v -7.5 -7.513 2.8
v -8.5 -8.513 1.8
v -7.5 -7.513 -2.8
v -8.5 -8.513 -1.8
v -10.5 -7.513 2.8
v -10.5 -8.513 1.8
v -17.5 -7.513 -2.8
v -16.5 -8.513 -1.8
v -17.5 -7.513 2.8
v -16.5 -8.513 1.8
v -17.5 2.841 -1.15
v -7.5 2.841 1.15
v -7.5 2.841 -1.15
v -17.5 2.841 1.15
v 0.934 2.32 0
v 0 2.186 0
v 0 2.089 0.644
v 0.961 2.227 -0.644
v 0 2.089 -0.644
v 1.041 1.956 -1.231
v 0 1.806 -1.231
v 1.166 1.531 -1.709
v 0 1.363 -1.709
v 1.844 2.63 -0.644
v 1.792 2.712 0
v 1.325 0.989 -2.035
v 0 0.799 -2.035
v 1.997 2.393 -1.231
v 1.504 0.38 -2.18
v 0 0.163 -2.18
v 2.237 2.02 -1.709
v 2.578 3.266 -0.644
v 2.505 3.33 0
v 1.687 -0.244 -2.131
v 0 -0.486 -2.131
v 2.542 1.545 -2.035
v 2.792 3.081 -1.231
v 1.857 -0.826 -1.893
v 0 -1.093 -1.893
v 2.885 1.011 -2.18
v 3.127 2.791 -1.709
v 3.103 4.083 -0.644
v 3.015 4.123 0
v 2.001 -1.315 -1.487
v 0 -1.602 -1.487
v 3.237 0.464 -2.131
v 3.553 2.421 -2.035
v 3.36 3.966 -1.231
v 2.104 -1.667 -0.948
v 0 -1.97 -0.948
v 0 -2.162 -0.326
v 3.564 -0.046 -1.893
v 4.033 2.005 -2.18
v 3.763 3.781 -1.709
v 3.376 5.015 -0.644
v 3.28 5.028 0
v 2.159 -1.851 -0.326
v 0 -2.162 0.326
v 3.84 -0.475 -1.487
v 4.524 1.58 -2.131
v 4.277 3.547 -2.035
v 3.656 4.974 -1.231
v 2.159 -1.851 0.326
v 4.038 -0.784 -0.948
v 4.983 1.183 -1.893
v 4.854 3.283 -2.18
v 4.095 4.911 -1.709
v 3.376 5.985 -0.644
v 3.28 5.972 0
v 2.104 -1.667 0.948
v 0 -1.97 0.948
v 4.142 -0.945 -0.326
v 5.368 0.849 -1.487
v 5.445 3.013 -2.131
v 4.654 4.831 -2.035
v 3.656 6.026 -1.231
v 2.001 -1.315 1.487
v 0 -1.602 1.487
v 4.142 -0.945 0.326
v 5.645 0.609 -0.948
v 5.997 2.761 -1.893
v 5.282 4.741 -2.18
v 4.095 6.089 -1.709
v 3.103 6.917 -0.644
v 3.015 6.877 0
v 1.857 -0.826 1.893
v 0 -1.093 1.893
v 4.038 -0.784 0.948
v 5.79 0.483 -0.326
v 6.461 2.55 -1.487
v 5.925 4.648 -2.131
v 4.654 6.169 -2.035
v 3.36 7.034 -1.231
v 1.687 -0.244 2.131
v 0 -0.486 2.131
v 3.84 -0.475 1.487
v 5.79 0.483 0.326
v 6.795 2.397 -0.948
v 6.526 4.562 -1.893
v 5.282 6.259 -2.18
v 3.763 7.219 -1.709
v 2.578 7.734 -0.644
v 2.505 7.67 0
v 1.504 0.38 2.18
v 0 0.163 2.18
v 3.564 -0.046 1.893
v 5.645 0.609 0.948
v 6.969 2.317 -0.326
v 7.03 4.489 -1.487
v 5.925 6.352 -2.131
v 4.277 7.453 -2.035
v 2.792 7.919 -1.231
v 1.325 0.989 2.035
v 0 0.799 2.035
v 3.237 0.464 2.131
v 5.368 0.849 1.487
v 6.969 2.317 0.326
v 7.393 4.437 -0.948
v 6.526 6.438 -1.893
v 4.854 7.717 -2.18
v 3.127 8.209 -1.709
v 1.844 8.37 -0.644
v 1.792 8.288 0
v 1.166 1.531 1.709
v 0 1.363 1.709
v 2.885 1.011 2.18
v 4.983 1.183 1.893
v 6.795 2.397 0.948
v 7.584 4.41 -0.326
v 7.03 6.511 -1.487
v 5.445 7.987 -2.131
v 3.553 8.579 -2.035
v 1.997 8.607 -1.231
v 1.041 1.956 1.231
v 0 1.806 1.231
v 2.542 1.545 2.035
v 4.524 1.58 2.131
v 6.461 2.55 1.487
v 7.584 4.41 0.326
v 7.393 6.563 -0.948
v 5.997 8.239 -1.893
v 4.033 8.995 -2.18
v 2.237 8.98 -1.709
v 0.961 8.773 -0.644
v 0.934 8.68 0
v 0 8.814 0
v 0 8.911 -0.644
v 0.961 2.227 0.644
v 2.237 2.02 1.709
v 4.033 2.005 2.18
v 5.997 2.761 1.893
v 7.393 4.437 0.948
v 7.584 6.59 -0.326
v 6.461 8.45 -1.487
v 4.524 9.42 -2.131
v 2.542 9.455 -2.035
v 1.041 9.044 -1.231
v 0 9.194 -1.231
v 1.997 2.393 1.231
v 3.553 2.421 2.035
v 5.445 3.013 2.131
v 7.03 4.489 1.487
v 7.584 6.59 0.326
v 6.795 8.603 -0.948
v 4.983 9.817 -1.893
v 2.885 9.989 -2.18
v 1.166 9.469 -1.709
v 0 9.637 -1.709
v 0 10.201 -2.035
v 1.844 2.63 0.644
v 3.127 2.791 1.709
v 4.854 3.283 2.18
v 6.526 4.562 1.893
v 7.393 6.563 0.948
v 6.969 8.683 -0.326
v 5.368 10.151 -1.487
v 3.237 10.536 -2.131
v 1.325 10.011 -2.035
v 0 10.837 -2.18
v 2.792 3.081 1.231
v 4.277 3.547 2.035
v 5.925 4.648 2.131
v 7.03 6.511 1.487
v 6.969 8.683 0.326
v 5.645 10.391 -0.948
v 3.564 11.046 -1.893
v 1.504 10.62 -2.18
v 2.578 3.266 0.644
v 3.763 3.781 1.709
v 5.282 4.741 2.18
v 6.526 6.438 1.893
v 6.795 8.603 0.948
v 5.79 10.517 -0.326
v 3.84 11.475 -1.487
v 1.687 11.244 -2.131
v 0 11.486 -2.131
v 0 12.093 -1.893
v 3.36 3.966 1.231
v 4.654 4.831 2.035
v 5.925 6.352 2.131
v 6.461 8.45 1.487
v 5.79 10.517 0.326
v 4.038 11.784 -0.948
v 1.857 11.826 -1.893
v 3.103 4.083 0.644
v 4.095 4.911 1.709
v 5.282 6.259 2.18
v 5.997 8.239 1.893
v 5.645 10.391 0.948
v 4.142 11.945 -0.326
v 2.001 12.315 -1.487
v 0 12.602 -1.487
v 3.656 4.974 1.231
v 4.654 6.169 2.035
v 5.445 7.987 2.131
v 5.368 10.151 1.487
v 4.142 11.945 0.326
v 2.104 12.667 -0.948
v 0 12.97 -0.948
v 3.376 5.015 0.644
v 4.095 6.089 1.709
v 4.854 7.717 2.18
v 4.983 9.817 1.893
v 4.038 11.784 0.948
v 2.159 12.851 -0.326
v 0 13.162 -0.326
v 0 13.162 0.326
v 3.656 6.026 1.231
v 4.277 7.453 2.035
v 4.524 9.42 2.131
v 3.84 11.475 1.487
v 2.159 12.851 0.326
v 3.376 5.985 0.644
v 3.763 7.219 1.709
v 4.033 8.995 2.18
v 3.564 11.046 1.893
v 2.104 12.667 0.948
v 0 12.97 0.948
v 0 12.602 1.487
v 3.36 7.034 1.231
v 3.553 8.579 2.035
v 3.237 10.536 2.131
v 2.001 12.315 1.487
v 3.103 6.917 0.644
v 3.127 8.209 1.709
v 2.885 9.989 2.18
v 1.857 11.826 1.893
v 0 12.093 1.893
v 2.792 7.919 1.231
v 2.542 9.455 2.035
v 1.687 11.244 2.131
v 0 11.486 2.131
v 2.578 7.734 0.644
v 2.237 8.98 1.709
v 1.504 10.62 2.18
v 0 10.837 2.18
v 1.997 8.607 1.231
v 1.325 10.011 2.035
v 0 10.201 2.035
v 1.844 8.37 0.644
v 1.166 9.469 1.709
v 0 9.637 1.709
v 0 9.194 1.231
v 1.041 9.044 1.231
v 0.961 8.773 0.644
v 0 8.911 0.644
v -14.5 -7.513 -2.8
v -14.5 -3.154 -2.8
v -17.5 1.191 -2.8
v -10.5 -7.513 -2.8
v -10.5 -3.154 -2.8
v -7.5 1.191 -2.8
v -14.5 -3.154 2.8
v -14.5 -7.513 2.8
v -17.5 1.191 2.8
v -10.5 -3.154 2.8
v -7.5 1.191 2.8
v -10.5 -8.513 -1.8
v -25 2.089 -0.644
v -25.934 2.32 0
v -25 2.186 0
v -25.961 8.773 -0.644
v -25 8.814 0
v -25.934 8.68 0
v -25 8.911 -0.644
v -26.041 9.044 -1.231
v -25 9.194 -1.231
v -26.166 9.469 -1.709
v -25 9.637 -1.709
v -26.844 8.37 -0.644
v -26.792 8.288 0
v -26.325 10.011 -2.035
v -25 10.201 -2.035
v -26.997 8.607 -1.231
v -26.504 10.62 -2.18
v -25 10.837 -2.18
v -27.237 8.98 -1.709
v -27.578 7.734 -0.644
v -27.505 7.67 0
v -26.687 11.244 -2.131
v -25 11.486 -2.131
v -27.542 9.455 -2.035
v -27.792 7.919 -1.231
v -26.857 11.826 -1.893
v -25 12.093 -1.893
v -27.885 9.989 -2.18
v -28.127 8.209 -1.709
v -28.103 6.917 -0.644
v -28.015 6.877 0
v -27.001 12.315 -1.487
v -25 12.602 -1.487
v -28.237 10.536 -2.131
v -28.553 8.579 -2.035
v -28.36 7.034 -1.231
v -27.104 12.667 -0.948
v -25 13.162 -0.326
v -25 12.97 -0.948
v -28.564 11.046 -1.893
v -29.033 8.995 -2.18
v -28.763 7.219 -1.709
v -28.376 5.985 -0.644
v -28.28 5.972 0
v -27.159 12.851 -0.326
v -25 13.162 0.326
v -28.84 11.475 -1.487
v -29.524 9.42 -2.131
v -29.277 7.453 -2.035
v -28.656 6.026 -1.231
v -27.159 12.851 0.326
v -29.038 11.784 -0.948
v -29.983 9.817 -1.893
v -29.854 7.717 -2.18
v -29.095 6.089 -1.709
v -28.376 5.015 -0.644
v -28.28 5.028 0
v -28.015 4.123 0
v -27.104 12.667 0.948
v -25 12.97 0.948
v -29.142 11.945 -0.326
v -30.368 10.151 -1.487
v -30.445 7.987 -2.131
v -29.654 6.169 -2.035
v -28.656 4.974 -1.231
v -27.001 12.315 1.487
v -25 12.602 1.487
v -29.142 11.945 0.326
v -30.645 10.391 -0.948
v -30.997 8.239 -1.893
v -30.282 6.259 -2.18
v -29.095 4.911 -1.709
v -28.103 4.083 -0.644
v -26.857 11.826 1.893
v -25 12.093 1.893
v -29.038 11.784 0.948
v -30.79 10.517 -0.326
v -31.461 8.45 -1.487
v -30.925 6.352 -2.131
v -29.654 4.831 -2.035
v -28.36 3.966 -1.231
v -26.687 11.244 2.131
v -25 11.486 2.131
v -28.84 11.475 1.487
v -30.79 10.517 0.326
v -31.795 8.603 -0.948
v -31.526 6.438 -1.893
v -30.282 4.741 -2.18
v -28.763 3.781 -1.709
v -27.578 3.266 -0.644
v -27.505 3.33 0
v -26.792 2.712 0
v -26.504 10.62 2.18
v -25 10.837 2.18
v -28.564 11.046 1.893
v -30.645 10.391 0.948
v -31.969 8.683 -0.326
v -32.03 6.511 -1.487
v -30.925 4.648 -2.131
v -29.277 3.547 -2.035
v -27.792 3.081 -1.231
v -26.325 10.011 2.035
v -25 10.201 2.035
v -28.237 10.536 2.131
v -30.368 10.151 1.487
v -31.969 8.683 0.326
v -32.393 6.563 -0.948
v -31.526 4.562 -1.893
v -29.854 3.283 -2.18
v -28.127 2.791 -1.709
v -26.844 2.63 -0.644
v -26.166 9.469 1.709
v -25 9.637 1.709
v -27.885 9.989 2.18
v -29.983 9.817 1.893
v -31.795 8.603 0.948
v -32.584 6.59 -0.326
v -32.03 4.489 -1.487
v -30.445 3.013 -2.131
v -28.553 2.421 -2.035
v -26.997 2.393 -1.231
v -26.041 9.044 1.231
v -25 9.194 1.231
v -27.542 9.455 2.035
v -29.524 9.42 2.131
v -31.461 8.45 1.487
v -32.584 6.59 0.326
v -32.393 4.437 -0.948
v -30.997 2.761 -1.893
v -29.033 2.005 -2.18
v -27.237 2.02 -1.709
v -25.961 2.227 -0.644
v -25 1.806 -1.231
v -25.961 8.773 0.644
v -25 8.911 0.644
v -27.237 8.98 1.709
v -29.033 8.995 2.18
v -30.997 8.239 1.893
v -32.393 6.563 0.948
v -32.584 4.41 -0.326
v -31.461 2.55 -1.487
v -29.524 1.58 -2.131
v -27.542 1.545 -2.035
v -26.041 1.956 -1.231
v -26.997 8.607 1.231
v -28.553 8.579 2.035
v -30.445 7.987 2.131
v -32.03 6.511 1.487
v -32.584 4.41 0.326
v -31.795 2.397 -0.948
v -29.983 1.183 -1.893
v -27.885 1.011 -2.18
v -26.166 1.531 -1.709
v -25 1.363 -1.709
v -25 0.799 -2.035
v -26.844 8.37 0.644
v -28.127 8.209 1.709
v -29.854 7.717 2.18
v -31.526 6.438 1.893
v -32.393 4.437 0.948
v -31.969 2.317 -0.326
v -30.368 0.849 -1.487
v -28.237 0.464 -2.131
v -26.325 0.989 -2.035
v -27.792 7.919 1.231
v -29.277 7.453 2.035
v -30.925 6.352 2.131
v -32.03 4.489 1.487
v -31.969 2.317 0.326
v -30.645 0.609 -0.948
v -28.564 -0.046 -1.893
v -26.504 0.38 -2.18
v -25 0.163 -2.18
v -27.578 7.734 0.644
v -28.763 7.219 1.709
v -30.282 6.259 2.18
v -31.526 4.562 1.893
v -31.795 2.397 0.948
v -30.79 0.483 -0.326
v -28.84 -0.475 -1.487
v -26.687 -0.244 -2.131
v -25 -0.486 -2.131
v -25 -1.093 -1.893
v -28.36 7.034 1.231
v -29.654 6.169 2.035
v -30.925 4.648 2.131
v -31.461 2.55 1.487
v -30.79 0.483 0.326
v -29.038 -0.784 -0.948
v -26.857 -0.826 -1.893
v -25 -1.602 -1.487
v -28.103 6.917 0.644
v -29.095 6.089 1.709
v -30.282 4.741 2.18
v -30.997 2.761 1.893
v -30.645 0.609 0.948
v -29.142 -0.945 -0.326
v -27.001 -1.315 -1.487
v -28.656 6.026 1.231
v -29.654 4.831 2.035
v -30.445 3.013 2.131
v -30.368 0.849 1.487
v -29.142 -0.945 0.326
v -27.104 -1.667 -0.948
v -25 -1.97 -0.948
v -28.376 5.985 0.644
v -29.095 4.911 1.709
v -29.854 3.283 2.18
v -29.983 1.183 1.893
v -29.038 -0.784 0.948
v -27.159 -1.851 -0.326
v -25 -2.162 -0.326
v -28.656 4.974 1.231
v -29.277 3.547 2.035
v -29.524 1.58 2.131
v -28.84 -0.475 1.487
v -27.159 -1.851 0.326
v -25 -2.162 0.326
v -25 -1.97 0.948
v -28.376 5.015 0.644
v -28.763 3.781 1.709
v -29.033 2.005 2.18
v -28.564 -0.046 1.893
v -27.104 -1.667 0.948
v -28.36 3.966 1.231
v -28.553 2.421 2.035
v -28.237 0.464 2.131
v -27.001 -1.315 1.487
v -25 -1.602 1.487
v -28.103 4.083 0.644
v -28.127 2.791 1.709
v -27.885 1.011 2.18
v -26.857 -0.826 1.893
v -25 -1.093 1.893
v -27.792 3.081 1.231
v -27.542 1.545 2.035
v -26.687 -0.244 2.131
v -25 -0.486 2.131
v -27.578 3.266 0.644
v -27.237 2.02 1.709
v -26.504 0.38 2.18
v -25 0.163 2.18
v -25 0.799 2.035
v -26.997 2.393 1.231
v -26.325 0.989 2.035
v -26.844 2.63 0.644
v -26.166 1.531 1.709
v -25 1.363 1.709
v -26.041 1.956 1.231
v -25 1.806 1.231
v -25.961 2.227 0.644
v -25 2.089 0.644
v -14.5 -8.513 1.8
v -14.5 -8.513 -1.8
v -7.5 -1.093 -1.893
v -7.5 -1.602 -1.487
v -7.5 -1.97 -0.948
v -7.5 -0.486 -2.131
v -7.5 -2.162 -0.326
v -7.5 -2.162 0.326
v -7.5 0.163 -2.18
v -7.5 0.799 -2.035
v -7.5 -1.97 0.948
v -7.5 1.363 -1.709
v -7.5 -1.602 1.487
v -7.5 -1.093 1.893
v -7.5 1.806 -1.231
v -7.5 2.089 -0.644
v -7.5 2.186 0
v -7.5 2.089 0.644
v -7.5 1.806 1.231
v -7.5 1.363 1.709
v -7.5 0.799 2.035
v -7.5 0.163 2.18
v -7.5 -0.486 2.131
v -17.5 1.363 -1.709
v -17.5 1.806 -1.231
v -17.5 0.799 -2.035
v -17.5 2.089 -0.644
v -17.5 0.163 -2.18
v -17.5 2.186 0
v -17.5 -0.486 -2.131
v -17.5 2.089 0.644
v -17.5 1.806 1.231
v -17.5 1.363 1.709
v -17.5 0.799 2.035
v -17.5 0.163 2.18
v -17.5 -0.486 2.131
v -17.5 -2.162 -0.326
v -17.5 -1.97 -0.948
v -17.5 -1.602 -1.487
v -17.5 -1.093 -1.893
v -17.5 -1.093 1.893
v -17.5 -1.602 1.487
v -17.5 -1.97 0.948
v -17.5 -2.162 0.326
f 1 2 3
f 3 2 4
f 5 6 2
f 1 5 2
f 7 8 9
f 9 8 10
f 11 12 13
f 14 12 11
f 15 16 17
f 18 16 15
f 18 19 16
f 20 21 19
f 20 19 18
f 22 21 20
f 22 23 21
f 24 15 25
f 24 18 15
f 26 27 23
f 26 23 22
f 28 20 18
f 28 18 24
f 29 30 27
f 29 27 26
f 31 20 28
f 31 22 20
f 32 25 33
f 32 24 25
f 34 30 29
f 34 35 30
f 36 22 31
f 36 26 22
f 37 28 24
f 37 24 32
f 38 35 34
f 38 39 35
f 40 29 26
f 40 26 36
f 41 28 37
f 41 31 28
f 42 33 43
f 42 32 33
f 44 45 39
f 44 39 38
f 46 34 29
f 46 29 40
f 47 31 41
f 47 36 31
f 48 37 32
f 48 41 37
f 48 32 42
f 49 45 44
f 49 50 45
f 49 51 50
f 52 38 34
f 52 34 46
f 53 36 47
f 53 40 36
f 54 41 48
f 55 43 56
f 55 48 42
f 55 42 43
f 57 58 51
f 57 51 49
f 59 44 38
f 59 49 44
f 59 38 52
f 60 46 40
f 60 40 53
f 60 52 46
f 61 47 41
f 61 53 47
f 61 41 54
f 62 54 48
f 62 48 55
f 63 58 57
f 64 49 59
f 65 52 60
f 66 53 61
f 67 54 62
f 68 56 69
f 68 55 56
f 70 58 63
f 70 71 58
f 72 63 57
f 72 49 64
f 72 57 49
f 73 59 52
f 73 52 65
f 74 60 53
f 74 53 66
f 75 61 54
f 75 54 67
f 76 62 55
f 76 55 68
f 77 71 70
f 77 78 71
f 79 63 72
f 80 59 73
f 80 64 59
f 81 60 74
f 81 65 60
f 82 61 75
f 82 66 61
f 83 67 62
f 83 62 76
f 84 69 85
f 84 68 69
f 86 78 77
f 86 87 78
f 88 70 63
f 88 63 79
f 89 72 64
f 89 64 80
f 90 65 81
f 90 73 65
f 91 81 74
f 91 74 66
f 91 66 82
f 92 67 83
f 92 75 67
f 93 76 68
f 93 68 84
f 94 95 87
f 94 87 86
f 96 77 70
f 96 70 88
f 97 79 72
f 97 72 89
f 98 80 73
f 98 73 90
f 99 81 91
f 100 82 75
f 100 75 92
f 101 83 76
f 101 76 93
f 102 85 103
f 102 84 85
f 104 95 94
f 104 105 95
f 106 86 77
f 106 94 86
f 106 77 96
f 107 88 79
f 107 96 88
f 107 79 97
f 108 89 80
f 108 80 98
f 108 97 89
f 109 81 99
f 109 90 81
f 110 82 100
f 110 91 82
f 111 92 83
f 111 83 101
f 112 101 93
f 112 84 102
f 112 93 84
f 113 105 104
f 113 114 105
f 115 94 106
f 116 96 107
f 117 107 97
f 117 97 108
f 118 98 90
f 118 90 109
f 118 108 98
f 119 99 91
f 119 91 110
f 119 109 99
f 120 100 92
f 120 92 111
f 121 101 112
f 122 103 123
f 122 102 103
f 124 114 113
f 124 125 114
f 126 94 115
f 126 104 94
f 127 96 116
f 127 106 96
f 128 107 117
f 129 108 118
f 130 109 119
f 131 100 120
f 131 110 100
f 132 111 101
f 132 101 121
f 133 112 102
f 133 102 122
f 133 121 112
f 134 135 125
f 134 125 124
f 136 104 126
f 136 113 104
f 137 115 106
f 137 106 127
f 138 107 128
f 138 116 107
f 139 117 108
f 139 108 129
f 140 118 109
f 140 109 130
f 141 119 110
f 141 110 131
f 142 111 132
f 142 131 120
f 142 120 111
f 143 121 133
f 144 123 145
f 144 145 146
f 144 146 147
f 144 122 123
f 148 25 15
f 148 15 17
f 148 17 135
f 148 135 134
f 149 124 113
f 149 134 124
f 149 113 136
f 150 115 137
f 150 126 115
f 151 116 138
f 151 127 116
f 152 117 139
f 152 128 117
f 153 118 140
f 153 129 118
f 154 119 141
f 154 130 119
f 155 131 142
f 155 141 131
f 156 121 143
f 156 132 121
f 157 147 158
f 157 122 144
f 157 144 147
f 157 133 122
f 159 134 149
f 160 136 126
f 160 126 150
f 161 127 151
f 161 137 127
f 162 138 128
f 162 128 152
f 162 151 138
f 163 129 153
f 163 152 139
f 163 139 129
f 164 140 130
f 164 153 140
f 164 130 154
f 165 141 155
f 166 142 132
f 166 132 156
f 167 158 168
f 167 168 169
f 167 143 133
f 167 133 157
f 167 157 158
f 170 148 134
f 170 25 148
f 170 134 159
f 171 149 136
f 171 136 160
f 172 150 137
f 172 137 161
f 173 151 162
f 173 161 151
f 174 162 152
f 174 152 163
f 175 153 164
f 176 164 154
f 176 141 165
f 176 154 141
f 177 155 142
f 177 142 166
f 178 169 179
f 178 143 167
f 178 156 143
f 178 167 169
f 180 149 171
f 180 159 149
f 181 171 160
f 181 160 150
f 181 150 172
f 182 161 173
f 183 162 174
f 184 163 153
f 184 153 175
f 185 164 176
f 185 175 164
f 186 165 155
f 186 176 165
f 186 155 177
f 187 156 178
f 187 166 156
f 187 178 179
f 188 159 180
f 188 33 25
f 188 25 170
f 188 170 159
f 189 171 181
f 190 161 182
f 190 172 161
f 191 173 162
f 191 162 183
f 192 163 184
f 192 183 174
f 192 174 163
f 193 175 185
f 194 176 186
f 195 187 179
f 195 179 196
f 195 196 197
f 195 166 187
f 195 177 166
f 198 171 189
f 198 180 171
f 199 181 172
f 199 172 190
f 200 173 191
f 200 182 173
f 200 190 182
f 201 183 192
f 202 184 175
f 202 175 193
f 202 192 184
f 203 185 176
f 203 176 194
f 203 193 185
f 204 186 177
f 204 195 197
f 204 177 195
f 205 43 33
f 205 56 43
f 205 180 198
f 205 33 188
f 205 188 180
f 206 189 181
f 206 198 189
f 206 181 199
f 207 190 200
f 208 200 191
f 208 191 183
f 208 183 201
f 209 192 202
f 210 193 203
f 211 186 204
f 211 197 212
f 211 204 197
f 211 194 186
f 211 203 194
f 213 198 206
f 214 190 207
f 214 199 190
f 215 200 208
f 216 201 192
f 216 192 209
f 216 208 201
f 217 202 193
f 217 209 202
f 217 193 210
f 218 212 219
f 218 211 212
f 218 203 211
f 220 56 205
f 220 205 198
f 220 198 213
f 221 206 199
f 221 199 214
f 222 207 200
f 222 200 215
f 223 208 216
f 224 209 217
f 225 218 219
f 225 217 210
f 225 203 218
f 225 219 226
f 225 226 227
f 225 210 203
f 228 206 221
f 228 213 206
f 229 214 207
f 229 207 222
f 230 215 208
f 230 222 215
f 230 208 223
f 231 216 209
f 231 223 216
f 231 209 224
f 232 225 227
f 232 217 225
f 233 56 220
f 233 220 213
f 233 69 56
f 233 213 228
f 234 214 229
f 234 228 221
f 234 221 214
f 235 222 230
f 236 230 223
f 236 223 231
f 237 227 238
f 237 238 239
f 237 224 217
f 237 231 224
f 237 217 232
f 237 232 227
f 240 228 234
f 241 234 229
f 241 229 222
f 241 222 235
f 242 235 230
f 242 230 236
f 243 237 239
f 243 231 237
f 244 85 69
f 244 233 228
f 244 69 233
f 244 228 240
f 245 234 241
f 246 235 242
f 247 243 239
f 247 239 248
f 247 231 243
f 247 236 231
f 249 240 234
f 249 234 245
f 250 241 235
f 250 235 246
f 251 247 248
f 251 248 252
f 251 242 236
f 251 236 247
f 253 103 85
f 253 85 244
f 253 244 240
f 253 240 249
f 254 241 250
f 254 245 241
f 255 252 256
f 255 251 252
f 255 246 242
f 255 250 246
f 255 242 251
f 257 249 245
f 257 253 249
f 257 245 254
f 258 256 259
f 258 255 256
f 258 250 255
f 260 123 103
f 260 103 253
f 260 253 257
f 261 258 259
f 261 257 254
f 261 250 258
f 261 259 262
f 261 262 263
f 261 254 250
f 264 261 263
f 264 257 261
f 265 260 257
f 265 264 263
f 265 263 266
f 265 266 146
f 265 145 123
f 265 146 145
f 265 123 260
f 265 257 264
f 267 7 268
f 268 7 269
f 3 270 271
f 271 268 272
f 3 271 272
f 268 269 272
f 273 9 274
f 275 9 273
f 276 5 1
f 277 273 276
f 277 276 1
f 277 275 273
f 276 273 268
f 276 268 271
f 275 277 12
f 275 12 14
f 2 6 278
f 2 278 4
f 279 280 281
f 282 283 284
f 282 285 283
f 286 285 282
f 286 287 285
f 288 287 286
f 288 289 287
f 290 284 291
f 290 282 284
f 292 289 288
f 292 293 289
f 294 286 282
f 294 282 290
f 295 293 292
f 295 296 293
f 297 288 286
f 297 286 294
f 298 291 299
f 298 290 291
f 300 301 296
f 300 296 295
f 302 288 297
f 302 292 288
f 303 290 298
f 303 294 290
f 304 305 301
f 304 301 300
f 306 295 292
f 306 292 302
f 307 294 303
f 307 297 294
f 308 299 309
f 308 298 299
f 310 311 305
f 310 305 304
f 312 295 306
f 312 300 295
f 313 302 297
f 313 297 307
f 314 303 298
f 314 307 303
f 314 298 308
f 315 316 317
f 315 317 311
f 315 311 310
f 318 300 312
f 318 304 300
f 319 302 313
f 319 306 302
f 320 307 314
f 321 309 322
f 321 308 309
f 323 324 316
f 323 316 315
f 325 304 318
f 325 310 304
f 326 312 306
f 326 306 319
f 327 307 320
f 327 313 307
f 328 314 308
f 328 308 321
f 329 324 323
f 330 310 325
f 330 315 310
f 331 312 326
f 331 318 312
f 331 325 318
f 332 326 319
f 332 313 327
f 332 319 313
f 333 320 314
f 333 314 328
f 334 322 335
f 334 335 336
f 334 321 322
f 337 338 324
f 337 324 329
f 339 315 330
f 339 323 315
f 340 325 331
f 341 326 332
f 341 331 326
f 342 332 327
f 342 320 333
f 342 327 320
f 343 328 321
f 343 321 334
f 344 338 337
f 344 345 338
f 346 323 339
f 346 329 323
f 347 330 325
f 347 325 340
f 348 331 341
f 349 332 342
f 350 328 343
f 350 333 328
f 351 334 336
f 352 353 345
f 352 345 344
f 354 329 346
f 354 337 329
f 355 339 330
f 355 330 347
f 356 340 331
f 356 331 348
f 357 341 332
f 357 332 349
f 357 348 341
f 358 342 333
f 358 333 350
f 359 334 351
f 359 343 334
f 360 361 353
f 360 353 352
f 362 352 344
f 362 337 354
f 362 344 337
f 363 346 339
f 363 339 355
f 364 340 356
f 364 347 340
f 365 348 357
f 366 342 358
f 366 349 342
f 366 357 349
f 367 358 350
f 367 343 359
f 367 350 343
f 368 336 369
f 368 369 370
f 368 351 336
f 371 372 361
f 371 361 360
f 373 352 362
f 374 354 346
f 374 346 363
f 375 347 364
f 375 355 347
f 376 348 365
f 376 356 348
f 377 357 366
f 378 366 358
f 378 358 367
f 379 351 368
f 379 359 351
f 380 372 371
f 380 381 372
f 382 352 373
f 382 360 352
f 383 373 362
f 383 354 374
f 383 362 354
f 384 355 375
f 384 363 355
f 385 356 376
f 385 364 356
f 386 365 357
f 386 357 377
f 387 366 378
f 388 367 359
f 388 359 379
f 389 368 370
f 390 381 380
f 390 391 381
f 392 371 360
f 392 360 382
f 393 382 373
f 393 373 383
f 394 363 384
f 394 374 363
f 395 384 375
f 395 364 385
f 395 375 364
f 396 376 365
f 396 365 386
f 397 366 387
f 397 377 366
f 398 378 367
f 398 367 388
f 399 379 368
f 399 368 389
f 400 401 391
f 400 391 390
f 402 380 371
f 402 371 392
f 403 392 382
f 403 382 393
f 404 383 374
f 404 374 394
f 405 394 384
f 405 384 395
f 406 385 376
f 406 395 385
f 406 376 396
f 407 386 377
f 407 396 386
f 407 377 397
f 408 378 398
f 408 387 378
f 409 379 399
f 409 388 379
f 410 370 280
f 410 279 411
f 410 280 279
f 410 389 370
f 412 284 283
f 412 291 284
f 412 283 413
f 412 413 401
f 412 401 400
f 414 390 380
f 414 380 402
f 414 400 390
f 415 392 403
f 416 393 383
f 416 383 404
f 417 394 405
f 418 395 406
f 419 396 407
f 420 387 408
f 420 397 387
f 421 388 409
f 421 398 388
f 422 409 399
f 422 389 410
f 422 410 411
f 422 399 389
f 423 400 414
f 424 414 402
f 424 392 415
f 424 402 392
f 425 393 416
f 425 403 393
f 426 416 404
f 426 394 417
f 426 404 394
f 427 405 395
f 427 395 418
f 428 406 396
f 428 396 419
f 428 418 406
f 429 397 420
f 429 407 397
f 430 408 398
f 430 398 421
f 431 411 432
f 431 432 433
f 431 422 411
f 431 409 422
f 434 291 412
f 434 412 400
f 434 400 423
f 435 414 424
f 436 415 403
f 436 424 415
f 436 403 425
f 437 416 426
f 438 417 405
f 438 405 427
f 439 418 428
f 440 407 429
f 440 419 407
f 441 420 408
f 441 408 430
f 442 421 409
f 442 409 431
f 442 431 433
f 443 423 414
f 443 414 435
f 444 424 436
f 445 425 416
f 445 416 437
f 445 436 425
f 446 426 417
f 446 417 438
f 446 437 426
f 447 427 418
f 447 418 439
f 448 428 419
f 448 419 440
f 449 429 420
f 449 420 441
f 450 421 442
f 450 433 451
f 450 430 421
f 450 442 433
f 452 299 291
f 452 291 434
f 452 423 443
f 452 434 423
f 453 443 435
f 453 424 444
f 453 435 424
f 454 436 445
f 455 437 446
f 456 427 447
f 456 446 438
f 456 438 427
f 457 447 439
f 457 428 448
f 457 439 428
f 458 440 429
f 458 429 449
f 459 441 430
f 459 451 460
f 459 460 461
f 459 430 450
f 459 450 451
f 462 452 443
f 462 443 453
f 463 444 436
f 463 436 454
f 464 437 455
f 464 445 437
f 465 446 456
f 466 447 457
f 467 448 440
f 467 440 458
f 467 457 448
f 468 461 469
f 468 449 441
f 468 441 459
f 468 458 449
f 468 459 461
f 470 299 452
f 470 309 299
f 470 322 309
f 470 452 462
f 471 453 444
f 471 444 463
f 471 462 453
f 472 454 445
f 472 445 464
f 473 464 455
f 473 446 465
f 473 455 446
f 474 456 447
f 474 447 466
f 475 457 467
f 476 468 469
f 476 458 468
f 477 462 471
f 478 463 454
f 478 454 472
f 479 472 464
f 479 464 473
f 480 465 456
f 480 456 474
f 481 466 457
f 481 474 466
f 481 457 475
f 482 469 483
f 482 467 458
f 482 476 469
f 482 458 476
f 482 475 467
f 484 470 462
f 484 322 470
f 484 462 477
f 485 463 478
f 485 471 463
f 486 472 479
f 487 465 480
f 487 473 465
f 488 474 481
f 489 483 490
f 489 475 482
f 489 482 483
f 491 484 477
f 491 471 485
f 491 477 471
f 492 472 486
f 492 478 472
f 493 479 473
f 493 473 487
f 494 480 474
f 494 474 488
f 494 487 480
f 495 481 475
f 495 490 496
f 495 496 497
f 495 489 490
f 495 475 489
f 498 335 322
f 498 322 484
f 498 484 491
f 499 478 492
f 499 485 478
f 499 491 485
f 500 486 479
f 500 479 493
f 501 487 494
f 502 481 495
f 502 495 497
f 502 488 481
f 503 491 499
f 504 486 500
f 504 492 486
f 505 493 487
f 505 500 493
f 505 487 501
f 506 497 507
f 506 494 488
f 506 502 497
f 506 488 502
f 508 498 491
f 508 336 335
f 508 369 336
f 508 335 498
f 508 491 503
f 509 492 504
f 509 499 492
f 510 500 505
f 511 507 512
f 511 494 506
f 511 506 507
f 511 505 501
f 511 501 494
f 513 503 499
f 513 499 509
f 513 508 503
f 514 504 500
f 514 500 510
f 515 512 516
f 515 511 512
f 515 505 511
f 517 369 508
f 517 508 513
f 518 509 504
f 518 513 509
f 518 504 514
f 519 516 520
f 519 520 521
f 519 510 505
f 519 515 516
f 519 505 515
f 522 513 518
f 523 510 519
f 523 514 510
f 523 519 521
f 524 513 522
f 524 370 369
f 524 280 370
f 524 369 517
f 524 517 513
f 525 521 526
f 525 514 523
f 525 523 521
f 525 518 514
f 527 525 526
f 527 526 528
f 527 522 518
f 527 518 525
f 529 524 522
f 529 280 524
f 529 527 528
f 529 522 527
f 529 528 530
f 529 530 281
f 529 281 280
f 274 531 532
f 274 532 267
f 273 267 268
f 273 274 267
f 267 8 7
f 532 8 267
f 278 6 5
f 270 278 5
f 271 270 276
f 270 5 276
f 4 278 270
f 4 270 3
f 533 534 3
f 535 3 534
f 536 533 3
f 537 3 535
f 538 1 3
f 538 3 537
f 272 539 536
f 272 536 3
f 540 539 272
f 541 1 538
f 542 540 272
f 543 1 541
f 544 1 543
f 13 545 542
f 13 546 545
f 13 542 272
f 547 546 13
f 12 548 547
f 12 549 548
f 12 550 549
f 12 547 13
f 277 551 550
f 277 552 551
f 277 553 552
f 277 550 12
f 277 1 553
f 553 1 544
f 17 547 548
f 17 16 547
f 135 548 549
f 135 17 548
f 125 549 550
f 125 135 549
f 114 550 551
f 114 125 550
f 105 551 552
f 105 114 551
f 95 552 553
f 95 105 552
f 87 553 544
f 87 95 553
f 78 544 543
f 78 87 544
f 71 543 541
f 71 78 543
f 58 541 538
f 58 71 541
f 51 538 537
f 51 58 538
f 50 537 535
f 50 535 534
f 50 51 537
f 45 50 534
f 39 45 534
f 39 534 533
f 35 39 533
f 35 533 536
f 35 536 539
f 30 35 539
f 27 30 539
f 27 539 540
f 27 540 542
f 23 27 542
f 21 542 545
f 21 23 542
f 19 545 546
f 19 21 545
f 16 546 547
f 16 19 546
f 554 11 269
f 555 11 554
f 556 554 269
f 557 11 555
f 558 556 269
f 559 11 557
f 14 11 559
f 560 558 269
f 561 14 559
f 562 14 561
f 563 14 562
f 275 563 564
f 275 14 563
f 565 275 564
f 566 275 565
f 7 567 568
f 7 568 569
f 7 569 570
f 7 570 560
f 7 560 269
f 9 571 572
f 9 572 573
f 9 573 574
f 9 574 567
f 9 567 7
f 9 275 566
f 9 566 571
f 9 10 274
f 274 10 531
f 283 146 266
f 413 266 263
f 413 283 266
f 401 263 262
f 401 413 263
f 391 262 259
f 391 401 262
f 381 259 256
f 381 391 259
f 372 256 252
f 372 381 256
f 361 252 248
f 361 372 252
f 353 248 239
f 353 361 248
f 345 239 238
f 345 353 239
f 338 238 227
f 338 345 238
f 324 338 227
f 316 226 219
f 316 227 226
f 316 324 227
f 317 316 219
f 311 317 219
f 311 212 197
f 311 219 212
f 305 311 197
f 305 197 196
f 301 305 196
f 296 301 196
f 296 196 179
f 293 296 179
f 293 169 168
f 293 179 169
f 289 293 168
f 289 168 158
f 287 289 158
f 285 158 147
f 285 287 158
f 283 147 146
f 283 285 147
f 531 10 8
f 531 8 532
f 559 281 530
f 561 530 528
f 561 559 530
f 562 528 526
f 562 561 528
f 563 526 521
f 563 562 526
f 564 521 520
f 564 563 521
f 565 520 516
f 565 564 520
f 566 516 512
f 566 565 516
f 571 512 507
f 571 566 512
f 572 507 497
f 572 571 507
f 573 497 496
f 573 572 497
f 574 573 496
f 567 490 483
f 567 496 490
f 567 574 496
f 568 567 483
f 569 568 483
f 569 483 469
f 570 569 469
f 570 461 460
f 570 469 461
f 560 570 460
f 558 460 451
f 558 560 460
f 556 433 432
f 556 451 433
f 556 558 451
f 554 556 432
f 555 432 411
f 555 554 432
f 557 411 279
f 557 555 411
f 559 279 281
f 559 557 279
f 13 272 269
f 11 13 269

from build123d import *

# Parameters (mm, degrees)
F1_R     = 2.185992
F3_W     = 3
F3_H     = 5.359665
F4_DEPTH = 2.8
F5_SIZE  = 1.65
F6_SIZE  = 1


with BuildPart() as f2:
    # F2: sweep along a path in F0
    with BuildLine(Plane.XY) as f2_path:
        ThreePointArc((0, 0), (5.5, 5.5), (0, 11))
        Line((0, 11), (-25, 11))
        ThreePointArc((-25, 11), (-30.5, 5.5), (-25, 0))
        Line((-25, 0), (0, 0))
    # F1 (on Right) → F2 (sweep)
    with BuildSketch(Plane.YZ):
        Circle(F1_R)
    sweep(path=f2_path.line)

    # F3 (on Top) → F4 (join, symmetric)
    with BuildSketch(Plane.XY):
        Polygon((-7.5, 2.841404), (-17.5, 2.841404), (-17.5, -3.153709), (-14.5, -3.153709), (-10.5, -3.153709), (-7.5, -3.153709), align=None)
        with Locations((-16, -5.833541)):
            Rectangle(F3_W, F3_H)
        with Locations((-9, -5.833541)):
            Rectangle(F3_W, F3_H)
    extrude(amount=F4_DEPTH, both=True)

    # F5
    f5_edges = [f2.edges().sort_by_distance(p)[0] for p in [
        (-12.5, 2.841404, 2.8),
        (-12.5, 2.841404, -2.8),
    ]]
    chamfer(f5_edges, length=F5_SIZE)

    # F6
    f6_edges = [f2.edges().sort_by_distance(p)[0] for p in [
        (-9, -8.513374, -2.8),
        (-7.5, -8.513374, 0),
        (-9, -8.513374, 2.8),
        (-16, -8.513374, -2.8),
        (-17.5, -8.513374, 0),
        (-16, -8.513374, 2.8),
    ]]
    chamfer(f6_edges, length=F6_SIZE)


solid = f2.part
